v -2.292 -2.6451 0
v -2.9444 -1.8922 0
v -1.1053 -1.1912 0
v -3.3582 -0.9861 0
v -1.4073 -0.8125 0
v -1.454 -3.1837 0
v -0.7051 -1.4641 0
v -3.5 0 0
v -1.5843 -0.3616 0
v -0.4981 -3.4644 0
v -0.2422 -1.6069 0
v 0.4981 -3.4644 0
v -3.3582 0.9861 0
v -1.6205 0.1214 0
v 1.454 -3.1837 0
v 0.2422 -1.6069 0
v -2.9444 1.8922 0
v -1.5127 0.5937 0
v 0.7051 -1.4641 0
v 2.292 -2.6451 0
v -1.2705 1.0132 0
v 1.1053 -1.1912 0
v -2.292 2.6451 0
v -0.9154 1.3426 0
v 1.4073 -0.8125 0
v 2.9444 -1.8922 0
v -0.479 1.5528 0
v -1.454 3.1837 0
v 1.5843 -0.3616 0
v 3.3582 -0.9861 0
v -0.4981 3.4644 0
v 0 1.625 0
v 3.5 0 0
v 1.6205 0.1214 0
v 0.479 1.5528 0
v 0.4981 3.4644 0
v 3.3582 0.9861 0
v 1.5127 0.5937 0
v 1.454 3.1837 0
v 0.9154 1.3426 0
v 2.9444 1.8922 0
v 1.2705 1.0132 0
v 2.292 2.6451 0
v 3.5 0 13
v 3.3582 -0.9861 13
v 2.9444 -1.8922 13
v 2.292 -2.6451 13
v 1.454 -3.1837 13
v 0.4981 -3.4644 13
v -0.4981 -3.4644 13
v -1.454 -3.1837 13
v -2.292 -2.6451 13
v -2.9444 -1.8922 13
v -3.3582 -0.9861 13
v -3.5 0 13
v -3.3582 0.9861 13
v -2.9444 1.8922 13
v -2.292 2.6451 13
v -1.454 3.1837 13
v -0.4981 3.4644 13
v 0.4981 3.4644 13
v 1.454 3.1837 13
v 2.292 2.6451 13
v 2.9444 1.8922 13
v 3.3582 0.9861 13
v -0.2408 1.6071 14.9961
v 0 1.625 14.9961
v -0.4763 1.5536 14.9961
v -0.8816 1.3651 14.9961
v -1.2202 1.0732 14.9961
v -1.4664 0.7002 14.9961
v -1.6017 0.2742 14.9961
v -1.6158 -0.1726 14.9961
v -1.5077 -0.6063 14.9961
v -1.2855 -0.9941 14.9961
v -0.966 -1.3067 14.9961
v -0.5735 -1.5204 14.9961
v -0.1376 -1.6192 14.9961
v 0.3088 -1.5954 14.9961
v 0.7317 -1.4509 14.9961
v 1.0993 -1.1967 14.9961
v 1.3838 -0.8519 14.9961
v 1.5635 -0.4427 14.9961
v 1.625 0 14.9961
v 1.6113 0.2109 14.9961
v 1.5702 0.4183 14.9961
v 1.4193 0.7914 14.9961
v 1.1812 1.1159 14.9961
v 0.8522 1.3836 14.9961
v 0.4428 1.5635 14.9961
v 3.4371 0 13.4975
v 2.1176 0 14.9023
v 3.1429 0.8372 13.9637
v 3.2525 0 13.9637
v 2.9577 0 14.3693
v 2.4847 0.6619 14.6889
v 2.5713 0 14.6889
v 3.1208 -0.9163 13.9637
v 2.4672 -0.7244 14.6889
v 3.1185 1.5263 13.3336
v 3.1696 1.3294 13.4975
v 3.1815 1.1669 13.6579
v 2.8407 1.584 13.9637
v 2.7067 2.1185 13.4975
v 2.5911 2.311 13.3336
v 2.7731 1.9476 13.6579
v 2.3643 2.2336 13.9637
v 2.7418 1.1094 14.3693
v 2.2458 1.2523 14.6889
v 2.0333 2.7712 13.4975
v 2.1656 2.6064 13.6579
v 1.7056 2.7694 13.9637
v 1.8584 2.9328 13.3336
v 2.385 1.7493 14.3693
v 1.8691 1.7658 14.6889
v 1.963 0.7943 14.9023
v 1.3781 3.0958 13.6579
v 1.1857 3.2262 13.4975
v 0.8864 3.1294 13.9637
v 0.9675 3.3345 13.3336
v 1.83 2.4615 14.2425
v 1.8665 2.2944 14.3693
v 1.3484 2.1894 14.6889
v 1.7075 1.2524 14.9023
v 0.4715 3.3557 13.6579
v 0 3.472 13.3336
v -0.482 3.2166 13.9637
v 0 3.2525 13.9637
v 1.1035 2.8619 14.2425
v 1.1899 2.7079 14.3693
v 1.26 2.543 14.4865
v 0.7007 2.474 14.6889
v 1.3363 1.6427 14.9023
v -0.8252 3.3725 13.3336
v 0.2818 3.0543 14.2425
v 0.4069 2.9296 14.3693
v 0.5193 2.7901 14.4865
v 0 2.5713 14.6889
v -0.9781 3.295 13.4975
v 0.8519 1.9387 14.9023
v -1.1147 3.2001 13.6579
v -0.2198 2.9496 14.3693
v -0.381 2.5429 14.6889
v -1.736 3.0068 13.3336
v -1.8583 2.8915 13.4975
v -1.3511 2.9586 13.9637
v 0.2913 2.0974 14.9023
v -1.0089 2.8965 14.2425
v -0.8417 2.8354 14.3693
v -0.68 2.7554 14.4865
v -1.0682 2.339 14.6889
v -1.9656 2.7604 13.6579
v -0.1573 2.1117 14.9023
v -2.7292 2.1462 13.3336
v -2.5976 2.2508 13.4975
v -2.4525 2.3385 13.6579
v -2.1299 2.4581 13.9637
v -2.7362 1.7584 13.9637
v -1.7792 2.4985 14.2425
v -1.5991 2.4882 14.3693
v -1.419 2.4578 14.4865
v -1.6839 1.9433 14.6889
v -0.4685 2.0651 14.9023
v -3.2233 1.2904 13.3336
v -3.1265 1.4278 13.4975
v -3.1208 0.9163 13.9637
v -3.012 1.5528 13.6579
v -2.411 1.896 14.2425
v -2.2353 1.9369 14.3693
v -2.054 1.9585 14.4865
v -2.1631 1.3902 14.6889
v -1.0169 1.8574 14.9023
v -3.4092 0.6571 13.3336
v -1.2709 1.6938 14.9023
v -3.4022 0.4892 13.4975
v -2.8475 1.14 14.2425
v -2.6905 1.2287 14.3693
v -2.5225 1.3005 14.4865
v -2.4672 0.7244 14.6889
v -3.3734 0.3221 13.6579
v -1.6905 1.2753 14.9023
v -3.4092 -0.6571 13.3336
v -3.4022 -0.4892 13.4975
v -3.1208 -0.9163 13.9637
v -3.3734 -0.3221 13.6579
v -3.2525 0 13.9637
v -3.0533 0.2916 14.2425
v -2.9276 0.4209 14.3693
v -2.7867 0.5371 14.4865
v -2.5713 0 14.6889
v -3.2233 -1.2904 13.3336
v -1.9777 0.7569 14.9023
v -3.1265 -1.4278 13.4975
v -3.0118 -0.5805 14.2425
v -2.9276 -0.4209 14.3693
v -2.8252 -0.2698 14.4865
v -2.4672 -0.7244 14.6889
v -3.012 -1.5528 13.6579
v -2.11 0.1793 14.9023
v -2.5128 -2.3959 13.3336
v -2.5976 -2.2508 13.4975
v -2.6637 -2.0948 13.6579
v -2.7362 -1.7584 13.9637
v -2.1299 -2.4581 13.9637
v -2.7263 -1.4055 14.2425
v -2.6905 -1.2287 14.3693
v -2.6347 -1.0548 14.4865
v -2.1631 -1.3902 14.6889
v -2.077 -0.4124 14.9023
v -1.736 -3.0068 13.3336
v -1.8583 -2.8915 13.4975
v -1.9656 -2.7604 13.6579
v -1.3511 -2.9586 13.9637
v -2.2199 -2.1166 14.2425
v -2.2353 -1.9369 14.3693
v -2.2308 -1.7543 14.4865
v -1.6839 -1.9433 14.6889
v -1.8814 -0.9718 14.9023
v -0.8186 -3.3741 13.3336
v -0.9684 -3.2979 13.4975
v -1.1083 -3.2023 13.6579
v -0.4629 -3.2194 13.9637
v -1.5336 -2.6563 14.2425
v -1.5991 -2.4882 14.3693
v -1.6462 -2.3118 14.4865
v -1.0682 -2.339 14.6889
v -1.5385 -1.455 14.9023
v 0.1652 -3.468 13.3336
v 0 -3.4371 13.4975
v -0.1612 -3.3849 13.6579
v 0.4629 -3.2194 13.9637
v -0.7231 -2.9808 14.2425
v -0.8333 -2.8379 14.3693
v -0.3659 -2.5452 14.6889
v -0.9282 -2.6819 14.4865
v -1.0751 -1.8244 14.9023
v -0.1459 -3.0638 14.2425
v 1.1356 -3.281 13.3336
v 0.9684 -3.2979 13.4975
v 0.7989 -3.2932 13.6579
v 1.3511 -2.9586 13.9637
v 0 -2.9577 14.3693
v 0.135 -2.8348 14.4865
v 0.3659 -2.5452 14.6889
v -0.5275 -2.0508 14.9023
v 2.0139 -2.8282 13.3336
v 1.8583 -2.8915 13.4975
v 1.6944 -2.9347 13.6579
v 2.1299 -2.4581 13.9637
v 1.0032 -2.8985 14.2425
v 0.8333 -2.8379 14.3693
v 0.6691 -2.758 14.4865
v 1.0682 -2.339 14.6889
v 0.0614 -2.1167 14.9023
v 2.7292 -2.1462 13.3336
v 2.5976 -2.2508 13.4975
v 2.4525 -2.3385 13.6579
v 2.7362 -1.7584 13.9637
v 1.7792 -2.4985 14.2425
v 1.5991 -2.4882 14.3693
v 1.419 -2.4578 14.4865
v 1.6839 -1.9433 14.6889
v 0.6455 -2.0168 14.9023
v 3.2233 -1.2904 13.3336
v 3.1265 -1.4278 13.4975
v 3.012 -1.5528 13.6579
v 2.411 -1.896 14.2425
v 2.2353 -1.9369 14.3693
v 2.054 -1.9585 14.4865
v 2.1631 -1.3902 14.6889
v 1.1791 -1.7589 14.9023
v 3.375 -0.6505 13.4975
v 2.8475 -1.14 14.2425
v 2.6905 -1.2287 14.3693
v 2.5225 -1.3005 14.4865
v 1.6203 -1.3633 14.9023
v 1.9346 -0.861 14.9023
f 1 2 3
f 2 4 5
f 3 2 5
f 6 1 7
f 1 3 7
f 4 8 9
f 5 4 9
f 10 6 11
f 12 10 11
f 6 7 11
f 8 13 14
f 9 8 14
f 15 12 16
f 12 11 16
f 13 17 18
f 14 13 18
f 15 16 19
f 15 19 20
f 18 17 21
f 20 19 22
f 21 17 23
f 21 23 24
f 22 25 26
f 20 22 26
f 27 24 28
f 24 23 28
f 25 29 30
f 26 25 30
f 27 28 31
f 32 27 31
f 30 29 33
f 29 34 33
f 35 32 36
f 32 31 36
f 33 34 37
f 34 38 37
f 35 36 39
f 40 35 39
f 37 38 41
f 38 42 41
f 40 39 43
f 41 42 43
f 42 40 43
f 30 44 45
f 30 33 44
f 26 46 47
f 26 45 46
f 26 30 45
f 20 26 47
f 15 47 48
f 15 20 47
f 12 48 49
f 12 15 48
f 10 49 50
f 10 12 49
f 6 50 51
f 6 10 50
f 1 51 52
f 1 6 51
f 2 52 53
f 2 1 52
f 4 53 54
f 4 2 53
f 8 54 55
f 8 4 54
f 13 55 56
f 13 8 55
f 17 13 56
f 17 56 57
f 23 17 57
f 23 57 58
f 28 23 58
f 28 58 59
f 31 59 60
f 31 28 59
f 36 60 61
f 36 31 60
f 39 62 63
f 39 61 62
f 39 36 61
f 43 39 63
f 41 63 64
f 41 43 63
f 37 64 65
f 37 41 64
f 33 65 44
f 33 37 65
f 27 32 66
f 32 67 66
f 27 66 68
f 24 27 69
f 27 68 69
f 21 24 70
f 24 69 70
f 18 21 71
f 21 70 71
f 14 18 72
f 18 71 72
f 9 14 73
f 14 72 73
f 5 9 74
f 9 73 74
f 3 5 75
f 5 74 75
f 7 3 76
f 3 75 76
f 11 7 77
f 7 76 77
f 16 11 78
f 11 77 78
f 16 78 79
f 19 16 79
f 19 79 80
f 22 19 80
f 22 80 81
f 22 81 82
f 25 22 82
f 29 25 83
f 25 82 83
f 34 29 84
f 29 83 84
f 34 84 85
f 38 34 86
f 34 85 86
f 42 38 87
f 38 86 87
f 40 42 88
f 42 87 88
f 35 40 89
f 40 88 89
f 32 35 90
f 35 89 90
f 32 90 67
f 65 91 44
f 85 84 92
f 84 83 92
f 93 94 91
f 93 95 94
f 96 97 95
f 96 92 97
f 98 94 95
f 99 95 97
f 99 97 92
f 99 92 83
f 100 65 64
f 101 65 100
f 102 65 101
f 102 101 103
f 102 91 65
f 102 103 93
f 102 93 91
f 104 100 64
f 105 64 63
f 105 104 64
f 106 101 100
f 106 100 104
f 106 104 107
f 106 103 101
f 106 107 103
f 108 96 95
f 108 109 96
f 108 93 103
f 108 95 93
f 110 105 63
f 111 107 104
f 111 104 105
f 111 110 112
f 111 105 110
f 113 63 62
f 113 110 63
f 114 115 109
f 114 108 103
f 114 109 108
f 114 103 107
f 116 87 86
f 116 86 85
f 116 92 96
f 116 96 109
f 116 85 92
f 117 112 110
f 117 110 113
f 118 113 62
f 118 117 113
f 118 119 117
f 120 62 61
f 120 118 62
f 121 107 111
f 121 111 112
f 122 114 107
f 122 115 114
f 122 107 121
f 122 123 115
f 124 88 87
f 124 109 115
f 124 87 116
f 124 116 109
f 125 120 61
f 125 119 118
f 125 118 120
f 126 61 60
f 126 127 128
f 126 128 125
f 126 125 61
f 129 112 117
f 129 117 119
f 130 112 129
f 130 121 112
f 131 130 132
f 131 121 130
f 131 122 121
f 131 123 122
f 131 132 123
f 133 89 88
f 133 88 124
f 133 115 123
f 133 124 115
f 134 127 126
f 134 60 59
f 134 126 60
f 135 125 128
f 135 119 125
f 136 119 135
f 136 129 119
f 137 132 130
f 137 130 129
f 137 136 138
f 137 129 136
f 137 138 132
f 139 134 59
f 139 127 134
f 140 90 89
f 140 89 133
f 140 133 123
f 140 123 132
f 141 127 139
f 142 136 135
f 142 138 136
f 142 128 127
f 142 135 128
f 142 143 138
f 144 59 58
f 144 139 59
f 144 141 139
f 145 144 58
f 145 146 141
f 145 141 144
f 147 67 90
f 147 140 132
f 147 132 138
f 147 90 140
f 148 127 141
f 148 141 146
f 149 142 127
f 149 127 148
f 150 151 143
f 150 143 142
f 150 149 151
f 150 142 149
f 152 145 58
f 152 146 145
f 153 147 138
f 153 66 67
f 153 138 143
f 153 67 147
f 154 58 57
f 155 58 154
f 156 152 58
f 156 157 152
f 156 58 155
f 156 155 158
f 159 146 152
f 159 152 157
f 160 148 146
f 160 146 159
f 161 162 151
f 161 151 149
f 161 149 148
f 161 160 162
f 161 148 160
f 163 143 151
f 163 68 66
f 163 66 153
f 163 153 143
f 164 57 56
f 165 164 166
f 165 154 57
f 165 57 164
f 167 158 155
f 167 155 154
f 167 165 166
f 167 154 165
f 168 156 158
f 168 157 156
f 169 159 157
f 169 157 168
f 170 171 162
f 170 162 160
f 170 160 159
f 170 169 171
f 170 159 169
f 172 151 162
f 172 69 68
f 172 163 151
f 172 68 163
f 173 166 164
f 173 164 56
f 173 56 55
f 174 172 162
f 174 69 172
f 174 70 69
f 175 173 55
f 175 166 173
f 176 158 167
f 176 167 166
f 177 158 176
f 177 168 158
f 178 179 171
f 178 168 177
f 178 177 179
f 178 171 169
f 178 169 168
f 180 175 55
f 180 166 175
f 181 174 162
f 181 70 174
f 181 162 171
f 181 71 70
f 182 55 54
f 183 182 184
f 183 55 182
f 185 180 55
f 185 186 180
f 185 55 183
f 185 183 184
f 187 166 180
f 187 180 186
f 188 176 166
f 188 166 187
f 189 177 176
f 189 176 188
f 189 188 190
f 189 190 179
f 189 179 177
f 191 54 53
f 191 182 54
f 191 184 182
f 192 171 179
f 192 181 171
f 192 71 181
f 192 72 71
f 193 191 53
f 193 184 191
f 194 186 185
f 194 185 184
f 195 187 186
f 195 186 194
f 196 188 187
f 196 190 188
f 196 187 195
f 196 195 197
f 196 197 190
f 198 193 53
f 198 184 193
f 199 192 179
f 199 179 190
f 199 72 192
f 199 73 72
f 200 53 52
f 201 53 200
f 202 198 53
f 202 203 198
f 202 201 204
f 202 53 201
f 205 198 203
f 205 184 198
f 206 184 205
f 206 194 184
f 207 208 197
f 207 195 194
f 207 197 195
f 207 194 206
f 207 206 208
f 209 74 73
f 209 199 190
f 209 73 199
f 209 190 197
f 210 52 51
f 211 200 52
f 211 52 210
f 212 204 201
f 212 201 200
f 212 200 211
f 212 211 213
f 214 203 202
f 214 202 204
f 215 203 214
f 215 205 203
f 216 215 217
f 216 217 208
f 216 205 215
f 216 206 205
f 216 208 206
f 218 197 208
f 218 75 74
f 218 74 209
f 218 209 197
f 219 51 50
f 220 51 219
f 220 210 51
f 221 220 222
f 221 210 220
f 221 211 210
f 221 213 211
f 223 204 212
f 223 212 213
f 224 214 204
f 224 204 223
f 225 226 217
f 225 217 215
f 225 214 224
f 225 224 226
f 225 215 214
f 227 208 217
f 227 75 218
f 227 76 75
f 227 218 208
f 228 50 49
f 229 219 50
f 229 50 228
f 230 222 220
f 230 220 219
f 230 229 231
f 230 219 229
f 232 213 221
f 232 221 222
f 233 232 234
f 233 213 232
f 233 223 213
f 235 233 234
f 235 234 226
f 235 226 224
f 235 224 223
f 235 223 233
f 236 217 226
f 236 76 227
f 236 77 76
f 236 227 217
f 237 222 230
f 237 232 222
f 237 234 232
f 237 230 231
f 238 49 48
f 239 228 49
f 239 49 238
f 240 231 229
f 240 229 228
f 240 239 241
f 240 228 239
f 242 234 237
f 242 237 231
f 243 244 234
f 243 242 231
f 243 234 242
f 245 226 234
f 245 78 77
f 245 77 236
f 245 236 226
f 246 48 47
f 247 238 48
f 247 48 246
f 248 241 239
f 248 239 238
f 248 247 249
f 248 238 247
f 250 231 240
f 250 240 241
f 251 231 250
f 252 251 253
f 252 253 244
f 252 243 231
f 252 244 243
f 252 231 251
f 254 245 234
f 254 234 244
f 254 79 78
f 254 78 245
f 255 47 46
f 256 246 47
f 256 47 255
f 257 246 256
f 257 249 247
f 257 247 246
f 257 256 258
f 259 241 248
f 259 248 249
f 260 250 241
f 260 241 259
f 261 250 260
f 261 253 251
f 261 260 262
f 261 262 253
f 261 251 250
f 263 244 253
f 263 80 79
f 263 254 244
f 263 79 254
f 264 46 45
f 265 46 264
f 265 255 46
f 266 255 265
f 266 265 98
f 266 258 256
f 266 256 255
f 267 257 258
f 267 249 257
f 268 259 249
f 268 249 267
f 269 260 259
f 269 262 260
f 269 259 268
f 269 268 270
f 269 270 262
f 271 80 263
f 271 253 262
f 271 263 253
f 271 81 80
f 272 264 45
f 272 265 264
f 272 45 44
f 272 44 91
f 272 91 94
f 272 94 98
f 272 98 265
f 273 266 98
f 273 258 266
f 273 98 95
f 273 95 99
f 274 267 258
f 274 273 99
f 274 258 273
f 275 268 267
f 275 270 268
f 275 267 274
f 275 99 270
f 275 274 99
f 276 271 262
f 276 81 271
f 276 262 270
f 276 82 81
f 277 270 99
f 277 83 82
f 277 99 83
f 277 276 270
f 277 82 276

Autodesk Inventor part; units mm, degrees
ref_plane "YZ Plane" through (0, 0, 0) normal (1, 0, 0) x (0, 1, 0)
ref_plane "XZ Plane" through (0, 0, 0) normal (0, 1, 0) x (-1, 0, 0)
ref_plane "XY Plane" through (0, 0, 0) normal (0, 0, 1) x (1, 0, 0)
sketch "Sketch1" plane through (0, 0, 0) normal (0, 0, 1) x (1, 0, 0)
  circle A0 centre (0, 0) radius 3.5
  dimension "d0" = 7
extrude "Extrusion1" add sketch "Sketch1" along normal blind 15
fillet "Fillet1" radius 2 1 edges at (-3.5, 0, 15)
hole "Hole1" at (0, 0, 0) direction (0, 0, 1) diameter 3.25 end through all
properties part number "Landing Gear"
